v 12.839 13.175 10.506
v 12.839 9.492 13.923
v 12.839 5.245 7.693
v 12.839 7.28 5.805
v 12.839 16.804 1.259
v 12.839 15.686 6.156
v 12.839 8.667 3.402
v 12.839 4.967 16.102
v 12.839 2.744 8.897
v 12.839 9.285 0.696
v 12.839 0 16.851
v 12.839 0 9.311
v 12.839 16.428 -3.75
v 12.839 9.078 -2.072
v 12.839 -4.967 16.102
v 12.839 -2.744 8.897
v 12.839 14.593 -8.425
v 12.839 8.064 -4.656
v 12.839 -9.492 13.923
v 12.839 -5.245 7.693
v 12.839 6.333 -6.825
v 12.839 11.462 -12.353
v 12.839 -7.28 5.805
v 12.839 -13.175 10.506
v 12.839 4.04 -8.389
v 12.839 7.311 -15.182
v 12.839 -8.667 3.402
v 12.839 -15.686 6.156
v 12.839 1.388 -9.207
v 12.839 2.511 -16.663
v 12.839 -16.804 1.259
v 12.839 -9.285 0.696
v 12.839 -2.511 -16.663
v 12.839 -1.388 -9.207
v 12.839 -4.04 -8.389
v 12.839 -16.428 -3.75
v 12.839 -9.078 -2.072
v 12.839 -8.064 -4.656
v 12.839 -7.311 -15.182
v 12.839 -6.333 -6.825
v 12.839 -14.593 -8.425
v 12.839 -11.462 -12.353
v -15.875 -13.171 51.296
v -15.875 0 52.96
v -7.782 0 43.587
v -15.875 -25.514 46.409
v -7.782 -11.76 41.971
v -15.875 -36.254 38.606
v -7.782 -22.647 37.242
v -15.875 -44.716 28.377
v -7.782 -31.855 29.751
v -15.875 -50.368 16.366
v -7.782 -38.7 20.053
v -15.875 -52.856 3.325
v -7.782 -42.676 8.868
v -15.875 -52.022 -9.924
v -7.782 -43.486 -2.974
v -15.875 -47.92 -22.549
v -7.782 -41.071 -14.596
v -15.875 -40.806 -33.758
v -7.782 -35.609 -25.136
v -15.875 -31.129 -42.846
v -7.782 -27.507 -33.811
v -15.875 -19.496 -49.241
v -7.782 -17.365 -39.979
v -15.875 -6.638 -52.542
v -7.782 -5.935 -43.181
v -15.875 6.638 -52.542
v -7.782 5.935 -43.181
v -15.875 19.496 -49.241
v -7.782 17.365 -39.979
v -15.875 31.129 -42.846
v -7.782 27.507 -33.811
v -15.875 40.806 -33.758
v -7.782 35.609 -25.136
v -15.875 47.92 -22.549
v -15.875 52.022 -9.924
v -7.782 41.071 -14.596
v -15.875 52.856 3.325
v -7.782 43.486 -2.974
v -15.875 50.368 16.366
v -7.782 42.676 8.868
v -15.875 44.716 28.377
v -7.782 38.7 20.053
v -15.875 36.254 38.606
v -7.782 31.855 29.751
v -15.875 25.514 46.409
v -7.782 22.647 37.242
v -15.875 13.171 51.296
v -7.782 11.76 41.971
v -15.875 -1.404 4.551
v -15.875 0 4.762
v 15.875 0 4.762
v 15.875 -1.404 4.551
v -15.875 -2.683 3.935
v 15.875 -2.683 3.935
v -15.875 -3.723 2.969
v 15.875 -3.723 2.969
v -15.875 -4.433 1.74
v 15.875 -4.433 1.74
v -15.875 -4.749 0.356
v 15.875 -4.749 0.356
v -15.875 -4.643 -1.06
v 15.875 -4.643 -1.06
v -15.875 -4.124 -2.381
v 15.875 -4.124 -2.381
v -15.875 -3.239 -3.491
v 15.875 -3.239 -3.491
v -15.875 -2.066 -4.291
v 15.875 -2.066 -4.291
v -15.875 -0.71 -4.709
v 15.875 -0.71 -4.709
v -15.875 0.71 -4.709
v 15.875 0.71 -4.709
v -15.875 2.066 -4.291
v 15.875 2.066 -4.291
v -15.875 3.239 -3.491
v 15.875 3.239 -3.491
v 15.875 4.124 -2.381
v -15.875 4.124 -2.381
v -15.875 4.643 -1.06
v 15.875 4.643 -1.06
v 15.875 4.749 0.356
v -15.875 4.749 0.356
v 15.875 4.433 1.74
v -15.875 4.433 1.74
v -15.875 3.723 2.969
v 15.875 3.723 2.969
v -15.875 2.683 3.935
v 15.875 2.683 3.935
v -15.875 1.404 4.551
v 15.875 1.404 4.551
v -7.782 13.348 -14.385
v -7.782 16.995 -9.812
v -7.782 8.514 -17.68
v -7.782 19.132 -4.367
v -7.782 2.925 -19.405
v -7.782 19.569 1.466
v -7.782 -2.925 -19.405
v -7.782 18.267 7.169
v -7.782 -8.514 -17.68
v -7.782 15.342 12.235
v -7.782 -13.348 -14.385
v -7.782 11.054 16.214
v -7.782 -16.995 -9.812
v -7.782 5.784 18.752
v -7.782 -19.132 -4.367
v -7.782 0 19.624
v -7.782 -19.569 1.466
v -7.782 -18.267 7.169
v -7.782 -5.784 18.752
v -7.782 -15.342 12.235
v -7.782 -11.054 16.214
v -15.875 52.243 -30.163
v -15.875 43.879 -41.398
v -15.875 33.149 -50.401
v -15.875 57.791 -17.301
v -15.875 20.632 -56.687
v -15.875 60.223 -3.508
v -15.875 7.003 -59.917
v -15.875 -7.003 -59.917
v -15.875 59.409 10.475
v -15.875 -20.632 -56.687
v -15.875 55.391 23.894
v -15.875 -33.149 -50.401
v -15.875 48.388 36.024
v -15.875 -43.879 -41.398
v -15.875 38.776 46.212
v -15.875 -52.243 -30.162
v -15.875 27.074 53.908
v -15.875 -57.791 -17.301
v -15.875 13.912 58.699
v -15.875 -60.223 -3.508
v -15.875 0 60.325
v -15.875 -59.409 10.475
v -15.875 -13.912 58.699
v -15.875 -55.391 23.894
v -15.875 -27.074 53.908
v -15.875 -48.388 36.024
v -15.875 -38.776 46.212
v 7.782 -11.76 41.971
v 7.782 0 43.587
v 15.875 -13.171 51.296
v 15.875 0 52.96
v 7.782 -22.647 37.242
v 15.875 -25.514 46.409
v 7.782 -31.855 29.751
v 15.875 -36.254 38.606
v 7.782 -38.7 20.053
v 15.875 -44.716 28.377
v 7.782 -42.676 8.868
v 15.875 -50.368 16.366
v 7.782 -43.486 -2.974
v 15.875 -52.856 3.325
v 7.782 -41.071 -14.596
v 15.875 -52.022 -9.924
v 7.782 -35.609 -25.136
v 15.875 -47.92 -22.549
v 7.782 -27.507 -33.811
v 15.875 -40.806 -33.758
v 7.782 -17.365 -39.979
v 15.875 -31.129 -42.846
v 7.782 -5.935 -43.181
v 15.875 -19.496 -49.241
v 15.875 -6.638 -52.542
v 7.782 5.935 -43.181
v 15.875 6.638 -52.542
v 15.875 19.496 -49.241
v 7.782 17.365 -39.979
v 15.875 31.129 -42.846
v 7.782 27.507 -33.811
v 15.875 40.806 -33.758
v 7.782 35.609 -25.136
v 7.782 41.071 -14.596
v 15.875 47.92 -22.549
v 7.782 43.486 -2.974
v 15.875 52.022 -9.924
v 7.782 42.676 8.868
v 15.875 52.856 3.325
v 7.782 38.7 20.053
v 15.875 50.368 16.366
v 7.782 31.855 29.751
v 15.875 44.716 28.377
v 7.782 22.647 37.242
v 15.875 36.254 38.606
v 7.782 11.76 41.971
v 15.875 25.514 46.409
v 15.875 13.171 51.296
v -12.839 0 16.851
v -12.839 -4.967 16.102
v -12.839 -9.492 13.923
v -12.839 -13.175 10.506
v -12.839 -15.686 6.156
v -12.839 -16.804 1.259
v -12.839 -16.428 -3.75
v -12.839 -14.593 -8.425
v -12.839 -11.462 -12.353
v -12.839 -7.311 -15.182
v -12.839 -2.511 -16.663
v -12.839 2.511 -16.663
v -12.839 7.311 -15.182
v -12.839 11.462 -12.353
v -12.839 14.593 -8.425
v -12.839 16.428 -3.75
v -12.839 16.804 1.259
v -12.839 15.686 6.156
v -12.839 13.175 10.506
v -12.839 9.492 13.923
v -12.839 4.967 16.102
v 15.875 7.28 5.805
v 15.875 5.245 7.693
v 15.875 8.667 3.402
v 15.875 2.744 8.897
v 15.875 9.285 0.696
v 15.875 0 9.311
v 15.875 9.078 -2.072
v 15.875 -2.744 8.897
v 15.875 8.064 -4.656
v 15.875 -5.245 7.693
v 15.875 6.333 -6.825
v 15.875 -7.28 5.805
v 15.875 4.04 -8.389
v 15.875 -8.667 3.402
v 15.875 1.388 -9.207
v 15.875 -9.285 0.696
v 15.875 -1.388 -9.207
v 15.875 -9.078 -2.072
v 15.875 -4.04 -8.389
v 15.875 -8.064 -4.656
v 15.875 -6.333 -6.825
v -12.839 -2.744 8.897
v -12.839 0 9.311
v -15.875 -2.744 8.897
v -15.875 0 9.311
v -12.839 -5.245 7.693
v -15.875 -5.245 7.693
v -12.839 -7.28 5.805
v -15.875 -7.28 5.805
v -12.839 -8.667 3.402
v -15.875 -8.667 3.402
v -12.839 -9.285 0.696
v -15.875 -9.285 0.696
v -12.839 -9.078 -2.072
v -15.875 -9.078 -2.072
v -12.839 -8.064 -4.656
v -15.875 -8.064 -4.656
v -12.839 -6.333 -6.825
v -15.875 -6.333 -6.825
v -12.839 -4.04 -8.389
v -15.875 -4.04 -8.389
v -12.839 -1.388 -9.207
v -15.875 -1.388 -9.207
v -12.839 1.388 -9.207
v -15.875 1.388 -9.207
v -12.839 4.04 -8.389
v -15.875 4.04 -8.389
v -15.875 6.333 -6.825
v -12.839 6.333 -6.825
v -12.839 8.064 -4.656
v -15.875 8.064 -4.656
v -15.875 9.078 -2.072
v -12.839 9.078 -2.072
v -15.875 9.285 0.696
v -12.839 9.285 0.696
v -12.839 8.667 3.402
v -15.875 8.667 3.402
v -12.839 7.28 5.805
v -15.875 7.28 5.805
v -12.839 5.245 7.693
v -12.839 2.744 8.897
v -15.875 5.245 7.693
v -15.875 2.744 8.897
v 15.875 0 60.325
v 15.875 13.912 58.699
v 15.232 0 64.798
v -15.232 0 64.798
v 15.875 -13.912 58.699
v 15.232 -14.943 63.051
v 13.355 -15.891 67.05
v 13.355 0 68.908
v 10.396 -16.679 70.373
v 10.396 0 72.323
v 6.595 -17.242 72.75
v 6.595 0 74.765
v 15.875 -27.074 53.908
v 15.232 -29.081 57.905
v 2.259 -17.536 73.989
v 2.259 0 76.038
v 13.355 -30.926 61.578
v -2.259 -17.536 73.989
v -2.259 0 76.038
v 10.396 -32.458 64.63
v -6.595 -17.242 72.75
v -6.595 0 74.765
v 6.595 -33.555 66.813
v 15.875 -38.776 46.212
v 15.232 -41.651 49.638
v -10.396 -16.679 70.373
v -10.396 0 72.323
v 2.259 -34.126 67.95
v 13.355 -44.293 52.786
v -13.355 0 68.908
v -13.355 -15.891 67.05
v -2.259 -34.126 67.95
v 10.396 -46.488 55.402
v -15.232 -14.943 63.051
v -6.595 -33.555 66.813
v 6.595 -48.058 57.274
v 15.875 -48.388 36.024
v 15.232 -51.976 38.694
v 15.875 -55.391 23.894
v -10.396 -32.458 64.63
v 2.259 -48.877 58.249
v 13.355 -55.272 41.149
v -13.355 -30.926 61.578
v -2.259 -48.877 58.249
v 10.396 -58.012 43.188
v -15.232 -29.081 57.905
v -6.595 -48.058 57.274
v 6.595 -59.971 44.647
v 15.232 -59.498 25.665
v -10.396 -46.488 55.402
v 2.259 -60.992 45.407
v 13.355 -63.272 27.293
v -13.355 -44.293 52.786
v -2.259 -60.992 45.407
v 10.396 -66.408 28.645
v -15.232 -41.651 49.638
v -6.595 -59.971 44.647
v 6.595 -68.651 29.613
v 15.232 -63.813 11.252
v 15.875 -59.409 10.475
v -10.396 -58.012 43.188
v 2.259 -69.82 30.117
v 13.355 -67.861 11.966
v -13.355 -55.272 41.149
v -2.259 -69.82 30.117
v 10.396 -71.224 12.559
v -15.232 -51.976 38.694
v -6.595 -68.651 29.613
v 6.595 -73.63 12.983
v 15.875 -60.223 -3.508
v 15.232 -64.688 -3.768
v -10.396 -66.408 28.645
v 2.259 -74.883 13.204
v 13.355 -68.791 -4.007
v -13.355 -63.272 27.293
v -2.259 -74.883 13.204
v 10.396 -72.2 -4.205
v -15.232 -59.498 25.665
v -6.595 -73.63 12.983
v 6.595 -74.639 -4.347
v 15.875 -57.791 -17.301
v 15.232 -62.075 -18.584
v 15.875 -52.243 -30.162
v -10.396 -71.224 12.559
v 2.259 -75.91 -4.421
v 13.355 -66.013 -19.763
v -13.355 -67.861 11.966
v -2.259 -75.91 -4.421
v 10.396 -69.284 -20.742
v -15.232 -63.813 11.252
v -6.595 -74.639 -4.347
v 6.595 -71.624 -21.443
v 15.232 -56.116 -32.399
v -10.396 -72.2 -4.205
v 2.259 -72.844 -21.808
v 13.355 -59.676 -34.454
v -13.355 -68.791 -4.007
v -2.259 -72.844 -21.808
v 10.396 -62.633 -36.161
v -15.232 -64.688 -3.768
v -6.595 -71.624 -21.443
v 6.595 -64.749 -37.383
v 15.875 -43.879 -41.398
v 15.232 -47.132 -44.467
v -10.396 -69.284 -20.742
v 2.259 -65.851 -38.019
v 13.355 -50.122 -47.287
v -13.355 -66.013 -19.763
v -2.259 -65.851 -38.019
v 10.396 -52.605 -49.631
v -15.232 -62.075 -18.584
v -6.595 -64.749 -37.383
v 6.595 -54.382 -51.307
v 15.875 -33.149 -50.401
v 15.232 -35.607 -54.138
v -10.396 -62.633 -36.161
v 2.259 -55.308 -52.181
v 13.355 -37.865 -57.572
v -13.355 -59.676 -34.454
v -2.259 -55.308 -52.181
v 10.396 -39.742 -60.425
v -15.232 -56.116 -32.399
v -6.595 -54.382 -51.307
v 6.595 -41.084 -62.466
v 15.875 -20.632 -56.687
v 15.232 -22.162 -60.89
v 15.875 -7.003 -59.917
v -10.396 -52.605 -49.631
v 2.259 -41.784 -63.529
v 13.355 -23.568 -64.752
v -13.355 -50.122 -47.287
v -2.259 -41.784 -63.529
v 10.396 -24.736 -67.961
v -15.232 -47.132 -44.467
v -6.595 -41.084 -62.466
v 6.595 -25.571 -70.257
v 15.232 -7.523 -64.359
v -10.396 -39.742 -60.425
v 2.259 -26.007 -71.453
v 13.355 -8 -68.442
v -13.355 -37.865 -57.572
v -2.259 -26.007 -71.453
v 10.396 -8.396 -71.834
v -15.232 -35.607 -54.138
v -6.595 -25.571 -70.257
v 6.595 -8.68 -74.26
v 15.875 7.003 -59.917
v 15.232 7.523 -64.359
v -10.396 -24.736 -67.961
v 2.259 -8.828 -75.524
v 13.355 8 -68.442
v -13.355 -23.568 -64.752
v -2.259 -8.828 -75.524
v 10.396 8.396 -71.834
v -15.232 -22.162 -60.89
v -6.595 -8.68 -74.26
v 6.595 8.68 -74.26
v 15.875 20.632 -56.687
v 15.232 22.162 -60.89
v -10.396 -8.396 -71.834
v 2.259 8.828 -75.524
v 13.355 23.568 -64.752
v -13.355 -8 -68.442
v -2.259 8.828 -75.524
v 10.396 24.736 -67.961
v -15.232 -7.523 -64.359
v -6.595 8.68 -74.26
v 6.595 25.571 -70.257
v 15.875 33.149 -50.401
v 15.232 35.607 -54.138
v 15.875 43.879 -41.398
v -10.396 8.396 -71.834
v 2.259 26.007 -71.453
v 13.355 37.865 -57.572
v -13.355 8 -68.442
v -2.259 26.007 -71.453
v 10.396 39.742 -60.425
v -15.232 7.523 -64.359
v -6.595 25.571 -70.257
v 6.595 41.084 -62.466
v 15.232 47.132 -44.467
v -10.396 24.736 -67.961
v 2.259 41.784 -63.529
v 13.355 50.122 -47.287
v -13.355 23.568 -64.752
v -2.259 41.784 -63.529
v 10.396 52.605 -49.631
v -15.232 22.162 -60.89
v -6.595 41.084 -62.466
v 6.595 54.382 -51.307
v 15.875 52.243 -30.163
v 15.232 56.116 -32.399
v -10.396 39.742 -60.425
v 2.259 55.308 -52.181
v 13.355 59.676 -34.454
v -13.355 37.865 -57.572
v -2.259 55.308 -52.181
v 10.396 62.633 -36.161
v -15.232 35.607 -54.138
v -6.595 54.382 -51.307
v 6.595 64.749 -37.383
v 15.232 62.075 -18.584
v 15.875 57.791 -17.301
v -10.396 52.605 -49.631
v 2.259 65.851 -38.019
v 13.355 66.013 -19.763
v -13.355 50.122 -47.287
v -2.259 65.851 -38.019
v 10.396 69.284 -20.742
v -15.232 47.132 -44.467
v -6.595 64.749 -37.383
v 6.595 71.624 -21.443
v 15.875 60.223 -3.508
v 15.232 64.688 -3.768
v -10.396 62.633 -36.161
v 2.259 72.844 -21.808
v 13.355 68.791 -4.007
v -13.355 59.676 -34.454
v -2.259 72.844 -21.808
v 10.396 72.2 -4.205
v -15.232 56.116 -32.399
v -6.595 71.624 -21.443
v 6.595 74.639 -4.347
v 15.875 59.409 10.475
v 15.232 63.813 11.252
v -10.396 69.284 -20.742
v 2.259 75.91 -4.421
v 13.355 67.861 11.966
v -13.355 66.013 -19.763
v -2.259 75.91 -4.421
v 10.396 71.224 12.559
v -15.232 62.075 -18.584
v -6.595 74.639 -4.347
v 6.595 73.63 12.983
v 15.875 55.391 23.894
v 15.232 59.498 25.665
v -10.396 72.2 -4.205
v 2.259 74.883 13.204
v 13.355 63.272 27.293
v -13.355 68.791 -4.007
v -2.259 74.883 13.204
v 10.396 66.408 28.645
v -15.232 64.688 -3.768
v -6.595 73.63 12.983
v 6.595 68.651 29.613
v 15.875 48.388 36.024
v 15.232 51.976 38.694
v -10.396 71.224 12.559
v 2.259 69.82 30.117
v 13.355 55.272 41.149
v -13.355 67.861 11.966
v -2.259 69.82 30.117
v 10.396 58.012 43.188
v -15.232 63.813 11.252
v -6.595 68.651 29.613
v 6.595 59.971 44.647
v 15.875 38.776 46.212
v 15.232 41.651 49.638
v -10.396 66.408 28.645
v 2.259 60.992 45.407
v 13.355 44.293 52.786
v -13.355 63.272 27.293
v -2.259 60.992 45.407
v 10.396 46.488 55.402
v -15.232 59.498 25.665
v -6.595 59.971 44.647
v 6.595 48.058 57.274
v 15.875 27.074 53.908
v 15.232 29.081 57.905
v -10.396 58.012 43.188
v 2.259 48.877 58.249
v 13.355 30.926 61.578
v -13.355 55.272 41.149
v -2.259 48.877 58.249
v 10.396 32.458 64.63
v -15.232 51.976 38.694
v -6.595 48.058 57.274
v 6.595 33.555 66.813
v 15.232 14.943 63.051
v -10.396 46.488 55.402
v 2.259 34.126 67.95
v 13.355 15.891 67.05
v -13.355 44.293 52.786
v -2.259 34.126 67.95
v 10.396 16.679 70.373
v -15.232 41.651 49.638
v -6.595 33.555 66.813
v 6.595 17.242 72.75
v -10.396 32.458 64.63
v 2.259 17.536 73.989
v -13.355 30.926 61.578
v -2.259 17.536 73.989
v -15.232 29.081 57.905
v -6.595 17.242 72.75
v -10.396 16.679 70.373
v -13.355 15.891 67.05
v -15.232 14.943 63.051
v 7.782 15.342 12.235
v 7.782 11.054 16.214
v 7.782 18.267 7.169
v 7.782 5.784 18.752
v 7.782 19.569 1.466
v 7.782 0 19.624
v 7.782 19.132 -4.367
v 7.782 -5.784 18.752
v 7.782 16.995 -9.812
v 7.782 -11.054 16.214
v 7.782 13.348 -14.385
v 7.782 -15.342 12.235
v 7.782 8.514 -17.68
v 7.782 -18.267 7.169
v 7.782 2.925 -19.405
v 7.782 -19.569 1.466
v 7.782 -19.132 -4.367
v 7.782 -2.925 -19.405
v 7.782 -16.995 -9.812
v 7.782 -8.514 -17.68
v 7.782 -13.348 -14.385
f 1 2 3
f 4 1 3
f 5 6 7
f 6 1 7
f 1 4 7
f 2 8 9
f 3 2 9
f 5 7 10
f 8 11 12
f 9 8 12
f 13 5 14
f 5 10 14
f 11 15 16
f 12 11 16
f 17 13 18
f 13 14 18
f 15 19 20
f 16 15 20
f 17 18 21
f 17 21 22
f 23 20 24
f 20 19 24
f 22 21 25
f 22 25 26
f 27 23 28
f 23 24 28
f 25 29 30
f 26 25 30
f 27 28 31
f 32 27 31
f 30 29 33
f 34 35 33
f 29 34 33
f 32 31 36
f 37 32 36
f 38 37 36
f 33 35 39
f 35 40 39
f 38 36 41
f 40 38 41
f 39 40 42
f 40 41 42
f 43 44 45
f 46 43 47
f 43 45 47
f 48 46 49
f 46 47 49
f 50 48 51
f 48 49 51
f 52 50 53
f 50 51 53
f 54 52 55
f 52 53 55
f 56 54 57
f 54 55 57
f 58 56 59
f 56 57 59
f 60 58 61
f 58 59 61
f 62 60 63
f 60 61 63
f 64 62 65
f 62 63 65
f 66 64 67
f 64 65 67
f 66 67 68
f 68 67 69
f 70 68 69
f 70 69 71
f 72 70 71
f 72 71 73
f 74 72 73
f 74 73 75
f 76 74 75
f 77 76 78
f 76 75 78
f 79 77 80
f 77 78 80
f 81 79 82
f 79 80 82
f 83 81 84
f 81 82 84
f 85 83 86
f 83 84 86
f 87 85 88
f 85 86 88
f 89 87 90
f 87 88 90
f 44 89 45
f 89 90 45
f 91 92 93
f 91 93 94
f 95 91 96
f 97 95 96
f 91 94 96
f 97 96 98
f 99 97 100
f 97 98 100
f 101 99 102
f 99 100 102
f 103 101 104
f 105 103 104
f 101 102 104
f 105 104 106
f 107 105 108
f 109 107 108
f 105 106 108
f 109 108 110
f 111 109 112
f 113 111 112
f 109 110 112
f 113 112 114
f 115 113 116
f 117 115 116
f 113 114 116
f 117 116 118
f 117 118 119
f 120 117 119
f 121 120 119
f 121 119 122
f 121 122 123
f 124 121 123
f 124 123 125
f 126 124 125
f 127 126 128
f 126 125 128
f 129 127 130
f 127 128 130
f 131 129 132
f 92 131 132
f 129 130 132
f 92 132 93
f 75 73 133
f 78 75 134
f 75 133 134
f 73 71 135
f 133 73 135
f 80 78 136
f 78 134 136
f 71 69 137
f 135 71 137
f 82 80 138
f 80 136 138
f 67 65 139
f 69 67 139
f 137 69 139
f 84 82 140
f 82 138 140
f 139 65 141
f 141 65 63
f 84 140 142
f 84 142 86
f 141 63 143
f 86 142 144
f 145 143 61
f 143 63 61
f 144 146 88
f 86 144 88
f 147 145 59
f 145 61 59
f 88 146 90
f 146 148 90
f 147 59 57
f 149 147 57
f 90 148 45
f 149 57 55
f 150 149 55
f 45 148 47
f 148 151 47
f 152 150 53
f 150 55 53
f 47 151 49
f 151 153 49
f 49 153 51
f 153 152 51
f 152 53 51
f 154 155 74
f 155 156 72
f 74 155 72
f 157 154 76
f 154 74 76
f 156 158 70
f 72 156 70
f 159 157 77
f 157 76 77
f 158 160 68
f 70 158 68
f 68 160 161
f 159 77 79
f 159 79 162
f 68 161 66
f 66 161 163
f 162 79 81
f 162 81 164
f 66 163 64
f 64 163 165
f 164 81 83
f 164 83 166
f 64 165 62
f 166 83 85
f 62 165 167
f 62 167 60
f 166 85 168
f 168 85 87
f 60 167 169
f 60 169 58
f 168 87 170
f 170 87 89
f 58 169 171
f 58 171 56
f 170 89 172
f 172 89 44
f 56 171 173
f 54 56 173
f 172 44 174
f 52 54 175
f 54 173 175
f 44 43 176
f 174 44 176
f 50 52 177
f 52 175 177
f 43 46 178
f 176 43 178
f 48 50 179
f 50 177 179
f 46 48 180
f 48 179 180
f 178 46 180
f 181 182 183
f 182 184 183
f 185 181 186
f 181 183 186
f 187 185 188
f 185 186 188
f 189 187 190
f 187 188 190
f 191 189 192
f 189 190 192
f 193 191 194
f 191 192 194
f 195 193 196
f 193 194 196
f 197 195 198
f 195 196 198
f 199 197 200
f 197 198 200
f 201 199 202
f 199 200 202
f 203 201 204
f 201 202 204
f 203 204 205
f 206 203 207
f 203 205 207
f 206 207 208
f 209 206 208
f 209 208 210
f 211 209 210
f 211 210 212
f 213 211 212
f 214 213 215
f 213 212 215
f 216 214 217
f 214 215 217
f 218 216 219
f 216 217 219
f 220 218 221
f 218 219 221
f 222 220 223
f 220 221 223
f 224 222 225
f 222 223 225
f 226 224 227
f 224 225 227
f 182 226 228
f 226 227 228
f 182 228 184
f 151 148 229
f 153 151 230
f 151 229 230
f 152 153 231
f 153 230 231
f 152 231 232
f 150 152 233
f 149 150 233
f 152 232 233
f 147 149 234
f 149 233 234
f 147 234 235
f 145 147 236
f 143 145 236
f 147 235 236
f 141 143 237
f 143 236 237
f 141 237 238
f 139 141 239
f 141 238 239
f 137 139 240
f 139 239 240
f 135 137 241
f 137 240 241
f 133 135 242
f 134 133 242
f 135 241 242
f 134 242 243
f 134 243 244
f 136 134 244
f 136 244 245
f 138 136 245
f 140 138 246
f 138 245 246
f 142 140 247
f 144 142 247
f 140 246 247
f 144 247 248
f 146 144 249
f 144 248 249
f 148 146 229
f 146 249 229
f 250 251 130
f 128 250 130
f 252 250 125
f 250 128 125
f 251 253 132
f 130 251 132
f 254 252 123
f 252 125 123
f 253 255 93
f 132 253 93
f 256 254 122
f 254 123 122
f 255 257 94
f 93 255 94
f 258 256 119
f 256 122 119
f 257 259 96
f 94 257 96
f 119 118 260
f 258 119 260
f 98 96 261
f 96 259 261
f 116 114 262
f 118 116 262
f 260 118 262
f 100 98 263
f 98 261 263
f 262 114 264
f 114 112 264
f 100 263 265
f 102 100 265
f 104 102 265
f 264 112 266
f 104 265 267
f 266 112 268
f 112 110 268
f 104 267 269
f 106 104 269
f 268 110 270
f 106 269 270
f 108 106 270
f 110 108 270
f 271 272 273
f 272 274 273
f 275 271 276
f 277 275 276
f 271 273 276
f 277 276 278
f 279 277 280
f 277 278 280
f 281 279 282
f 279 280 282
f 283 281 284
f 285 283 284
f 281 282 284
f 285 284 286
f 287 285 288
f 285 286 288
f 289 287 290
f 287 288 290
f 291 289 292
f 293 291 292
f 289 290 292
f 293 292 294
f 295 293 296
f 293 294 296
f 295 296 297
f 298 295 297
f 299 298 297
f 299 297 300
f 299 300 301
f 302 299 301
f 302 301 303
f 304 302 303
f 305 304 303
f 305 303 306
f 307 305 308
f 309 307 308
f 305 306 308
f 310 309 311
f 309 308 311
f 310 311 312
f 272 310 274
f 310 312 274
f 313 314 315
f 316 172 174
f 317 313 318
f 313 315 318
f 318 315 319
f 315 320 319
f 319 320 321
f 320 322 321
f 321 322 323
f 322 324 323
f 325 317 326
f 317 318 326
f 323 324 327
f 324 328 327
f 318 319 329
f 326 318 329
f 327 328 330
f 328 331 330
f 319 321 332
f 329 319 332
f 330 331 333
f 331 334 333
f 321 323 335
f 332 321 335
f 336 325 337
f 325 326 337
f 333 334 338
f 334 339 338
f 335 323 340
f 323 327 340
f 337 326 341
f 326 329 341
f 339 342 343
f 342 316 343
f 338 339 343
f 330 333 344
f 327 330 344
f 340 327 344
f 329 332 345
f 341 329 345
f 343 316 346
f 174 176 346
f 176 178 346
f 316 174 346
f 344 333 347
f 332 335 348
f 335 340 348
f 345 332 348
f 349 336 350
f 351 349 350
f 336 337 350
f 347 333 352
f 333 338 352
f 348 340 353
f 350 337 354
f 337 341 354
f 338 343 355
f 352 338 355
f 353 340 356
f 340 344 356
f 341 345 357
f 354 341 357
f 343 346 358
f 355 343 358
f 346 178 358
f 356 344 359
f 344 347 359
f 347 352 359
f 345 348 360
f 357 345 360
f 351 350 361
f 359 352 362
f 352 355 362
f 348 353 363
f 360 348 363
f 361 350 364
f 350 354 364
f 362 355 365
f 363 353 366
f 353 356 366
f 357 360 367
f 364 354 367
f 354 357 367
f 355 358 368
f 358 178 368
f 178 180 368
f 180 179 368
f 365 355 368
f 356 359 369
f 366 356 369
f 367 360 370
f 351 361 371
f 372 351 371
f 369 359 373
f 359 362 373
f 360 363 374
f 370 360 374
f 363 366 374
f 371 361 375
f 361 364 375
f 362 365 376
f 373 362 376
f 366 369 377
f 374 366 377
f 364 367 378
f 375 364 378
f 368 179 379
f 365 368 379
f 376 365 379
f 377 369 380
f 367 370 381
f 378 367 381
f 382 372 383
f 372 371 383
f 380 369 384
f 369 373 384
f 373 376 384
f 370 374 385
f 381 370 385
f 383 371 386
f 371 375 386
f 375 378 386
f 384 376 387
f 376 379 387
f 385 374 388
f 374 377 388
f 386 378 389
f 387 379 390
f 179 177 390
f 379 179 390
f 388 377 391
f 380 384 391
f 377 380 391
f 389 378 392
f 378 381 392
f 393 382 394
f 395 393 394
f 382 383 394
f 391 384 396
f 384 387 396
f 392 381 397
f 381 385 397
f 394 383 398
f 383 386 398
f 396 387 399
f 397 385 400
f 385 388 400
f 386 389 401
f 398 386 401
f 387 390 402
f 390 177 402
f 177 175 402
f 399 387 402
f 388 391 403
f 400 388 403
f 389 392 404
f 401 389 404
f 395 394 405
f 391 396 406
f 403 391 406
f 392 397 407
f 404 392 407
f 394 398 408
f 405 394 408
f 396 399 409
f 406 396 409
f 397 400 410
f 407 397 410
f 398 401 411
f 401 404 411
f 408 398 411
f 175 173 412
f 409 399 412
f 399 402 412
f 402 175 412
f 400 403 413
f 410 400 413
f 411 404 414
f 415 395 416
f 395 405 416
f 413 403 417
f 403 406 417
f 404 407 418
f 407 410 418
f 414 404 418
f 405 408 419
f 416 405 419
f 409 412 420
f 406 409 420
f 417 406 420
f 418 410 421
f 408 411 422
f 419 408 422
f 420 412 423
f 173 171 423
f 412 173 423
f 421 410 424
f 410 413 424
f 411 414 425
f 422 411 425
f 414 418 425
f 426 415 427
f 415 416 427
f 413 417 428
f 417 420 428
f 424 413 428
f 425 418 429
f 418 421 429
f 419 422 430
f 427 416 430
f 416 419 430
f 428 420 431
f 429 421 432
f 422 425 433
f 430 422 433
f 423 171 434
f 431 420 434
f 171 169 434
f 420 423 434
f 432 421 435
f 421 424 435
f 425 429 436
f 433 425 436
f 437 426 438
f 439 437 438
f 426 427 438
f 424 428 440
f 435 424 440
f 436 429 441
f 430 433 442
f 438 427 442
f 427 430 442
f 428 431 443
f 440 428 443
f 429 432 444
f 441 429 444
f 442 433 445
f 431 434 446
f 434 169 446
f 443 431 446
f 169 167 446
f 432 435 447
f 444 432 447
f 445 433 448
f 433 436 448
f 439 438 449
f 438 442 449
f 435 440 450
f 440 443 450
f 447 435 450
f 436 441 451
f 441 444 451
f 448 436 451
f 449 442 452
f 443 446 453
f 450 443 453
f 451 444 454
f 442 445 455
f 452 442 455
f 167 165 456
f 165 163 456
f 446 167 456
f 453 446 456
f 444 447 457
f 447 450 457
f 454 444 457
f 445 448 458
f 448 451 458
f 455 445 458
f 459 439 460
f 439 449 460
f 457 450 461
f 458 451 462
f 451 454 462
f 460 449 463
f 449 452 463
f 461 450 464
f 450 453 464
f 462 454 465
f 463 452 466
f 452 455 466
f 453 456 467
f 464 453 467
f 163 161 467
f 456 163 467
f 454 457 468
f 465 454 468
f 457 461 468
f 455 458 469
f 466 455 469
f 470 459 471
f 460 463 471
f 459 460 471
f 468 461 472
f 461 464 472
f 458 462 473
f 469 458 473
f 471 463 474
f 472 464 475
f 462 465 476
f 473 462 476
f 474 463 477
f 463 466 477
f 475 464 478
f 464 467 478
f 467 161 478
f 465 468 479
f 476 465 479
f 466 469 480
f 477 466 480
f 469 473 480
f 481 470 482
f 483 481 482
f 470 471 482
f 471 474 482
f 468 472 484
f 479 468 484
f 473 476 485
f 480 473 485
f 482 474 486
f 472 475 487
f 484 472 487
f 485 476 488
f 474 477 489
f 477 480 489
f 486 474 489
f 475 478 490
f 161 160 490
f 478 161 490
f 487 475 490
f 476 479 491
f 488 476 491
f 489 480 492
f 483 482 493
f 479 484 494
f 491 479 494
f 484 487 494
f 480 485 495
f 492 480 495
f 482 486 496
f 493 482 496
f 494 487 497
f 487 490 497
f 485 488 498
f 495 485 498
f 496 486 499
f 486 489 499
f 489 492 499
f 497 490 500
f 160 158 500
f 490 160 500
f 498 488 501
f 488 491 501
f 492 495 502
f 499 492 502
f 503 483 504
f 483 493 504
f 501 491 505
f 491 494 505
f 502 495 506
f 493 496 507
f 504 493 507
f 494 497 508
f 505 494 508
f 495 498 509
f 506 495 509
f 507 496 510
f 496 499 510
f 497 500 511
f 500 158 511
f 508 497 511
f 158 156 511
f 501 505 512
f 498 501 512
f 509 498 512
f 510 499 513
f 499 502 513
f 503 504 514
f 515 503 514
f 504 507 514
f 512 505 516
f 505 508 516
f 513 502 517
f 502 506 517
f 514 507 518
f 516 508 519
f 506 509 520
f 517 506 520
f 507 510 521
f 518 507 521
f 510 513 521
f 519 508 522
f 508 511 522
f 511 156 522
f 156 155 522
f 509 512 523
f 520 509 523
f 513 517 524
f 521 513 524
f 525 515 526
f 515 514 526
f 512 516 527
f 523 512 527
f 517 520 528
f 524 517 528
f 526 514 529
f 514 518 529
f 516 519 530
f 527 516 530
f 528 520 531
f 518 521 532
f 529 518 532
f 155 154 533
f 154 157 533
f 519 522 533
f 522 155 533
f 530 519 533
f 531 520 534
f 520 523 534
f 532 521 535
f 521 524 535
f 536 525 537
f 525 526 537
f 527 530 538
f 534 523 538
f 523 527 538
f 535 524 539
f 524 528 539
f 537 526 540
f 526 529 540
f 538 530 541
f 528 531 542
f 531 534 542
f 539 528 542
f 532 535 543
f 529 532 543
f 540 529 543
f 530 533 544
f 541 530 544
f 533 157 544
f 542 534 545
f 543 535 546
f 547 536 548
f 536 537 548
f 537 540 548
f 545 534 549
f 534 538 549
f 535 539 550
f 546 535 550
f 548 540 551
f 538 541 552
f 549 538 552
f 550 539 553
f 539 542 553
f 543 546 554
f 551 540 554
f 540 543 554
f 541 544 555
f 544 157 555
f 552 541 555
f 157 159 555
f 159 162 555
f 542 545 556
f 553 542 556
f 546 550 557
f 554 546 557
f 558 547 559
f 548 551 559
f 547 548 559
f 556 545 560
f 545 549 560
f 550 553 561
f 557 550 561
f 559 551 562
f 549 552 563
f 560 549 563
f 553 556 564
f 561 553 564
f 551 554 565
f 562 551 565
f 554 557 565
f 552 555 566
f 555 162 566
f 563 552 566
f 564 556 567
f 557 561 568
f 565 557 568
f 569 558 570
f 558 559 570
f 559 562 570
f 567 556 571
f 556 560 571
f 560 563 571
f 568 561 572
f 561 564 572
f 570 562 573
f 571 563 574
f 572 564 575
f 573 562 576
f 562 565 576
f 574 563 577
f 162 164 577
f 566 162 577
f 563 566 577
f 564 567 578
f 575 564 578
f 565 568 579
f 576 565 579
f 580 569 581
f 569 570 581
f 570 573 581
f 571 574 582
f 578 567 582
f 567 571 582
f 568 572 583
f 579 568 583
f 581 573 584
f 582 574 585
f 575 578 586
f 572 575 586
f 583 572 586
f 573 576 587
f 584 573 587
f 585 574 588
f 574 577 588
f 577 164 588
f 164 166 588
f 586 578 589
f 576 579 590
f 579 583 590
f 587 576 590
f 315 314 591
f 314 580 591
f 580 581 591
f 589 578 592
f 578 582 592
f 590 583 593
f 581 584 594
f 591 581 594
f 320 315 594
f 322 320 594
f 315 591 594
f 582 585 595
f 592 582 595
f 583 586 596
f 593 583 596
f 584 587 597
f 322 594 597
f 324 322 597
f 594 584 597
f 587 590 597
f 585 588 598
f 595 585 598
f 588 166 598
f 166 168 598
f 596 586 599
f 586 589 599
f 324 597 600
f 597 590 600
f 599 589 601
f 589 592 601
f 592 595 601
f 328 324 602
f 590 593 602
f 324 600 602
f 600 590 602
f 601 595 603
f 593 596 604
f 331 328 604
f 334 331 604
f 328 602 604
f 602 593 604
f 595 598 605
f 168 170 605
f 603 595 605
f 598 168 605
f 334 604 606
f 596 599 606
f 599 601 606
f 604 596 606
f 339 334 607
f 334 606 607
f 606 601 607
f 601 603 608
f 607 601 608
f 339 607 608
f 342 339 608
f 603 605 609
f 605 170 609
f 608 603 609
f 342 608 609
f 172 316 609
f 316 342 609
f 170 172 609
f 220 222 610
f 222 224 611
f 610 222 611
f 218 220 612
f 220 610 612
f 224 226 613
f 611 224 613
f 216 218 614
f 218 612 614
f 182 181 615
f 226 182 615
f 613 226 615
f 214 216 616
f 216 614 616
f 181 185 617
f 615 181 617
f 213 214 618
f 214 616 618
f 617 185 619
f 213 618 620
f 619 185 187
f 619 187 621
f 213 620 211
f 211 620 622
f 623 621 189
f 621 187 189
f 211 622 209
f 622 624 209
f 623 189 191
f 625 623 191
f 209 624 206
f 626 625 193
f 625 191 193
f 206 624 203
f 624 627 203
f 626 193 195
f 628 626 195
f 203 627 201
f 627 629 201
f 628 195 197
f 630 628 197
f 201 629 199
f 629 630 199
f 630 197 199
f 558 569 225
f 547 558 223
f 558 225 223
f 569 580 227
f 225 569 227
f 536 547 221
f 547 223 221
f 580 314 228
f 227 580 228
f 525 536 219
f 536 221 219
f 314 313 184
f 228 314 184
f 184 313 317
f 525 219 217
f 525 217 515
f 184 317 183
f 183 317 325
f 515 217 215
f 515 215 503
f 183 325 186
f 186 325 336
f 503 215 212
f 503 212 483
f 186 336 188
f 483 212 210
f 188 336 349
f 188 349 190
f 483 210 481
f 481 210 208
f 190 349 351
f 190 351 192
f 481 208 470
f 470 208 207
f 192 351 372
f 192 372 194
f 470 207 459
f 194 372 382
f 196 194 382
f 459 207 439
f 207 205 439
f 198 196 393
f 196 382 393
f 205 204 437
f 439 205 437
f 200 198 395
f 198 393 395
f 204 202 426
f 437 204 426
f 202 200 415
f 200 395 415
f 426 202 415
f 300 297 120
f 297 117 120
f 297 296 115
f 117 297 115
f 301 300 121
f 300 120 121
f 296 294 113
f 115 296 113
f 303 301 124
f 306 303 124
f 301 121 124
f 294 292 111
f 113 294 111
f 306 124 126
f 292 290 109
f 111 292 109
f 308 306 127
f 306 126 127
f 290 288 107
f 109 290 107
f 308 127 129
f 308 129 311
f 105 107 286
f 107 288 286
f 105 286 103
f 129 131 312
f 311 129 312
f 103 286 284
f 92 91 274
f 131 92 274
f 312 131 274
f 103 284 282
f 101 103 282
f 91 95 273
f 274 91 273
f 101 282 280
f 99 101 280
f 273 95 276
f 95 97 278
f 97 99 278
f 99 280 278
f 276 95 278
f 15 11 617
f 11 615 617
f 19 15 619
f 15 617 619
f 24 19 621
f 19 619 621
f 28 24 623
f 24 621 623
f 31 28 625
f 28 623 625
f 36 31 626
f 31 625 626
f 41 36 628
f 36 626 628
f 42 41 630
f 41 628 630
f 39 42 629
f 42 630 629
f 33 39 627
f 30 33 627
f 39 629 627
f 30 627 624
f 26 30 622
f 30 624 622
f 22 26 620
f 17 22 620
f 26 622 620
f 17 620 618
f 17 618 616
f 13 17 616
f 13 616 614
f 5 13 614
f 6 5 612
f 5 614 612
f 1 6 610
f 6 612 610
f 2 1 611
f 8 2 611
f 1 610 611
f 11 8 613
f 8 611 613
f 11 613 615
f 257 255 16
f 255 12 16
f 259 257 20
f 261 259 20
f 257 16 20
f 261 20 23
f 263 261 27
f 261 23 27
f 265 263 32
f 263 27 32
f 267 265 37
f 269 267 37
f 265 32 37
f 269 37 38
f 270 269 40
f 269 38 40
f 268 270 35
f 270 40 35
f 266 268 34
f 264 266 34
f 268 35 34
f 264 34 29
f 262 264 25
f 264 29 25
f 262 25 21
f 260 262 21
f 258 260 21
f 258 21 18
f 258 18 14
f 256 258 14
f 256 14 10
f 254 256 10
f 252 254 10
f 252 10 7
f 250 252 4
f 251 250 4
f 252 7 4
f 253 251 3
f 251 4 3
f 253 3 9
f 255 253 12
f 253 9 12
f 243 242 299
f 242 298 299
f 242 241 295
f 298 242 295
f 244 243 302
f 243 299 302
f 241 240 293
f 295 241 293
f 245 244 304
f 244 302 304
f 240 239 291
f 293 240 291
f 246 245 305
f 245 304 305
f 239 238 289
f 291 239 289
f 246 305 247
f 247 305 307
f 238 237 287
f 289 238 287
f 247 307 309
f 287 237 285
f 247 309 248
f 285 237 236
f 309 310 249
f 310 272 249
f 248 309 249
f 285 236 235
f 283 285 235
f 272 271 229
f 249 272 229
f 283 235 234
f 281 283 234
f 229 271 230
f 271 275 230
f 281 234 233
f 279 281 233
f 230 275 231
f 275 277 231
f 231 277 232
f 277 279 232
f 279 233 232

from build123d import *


with BuildPart() as part:
    # Sketch1 → Revolve1 (revolve)
    with BuildSketch(Plane.XY, mode=Mode.PRIVATE) as revolve1_sk:
        with BuildLine():
            Line((-15.875, 4.7625), (15.875, 4.7625))
            Line((15.875, 4.7625), (15.875, 9.311015131))
            Line((15.875, 9.311015131), (12.83850319, 9.311015131))
            Line((12.83850319, 9.311015131), (12.83850319, 16.850886509))
            Line((12.83850319, 16.850886509), (7.782087298, 19.62375974))
            Line((7.782087298, 19.62375974), (7.782087298, 43.587197627))
            Line((7.782087298, 43.587197627), (15.875, 52.96008786))
            Line((15.875, 52.96008786), (15.875, 60.325))
            ThreePointArc((15.875, 60.325), (0, 76.2), (-15.875, 60.325))
            Line((-15.875, 60.325), (-15.875, 52.96008786))
            Line((-15.875, 52.96008786), (-7.782087298, 43.587197627))
            Line((-7.782087298, 43.587197627), (-7.782087298, 19.62375974))
            Line((-7.782087298, 19.62375974), (-12.83850319, 16.850886509))
            Line((-12.83850319, 16.850886509), (-12.83850319, 9.311015131))
            Line((-12.83850319, 9.311015131), (-15.875, 9.311015131))
            Line((-15.875, 9.311015131), (-15.875, 4.7625))
        make_face()
    revolve(revolve1_sk.sketch.rotate(Axis((-1000, 0, 0), (1, 0, 0)), 90), axis=Axis((-1000, 0, 0), (1, 0, 0)))


solid = part.part
